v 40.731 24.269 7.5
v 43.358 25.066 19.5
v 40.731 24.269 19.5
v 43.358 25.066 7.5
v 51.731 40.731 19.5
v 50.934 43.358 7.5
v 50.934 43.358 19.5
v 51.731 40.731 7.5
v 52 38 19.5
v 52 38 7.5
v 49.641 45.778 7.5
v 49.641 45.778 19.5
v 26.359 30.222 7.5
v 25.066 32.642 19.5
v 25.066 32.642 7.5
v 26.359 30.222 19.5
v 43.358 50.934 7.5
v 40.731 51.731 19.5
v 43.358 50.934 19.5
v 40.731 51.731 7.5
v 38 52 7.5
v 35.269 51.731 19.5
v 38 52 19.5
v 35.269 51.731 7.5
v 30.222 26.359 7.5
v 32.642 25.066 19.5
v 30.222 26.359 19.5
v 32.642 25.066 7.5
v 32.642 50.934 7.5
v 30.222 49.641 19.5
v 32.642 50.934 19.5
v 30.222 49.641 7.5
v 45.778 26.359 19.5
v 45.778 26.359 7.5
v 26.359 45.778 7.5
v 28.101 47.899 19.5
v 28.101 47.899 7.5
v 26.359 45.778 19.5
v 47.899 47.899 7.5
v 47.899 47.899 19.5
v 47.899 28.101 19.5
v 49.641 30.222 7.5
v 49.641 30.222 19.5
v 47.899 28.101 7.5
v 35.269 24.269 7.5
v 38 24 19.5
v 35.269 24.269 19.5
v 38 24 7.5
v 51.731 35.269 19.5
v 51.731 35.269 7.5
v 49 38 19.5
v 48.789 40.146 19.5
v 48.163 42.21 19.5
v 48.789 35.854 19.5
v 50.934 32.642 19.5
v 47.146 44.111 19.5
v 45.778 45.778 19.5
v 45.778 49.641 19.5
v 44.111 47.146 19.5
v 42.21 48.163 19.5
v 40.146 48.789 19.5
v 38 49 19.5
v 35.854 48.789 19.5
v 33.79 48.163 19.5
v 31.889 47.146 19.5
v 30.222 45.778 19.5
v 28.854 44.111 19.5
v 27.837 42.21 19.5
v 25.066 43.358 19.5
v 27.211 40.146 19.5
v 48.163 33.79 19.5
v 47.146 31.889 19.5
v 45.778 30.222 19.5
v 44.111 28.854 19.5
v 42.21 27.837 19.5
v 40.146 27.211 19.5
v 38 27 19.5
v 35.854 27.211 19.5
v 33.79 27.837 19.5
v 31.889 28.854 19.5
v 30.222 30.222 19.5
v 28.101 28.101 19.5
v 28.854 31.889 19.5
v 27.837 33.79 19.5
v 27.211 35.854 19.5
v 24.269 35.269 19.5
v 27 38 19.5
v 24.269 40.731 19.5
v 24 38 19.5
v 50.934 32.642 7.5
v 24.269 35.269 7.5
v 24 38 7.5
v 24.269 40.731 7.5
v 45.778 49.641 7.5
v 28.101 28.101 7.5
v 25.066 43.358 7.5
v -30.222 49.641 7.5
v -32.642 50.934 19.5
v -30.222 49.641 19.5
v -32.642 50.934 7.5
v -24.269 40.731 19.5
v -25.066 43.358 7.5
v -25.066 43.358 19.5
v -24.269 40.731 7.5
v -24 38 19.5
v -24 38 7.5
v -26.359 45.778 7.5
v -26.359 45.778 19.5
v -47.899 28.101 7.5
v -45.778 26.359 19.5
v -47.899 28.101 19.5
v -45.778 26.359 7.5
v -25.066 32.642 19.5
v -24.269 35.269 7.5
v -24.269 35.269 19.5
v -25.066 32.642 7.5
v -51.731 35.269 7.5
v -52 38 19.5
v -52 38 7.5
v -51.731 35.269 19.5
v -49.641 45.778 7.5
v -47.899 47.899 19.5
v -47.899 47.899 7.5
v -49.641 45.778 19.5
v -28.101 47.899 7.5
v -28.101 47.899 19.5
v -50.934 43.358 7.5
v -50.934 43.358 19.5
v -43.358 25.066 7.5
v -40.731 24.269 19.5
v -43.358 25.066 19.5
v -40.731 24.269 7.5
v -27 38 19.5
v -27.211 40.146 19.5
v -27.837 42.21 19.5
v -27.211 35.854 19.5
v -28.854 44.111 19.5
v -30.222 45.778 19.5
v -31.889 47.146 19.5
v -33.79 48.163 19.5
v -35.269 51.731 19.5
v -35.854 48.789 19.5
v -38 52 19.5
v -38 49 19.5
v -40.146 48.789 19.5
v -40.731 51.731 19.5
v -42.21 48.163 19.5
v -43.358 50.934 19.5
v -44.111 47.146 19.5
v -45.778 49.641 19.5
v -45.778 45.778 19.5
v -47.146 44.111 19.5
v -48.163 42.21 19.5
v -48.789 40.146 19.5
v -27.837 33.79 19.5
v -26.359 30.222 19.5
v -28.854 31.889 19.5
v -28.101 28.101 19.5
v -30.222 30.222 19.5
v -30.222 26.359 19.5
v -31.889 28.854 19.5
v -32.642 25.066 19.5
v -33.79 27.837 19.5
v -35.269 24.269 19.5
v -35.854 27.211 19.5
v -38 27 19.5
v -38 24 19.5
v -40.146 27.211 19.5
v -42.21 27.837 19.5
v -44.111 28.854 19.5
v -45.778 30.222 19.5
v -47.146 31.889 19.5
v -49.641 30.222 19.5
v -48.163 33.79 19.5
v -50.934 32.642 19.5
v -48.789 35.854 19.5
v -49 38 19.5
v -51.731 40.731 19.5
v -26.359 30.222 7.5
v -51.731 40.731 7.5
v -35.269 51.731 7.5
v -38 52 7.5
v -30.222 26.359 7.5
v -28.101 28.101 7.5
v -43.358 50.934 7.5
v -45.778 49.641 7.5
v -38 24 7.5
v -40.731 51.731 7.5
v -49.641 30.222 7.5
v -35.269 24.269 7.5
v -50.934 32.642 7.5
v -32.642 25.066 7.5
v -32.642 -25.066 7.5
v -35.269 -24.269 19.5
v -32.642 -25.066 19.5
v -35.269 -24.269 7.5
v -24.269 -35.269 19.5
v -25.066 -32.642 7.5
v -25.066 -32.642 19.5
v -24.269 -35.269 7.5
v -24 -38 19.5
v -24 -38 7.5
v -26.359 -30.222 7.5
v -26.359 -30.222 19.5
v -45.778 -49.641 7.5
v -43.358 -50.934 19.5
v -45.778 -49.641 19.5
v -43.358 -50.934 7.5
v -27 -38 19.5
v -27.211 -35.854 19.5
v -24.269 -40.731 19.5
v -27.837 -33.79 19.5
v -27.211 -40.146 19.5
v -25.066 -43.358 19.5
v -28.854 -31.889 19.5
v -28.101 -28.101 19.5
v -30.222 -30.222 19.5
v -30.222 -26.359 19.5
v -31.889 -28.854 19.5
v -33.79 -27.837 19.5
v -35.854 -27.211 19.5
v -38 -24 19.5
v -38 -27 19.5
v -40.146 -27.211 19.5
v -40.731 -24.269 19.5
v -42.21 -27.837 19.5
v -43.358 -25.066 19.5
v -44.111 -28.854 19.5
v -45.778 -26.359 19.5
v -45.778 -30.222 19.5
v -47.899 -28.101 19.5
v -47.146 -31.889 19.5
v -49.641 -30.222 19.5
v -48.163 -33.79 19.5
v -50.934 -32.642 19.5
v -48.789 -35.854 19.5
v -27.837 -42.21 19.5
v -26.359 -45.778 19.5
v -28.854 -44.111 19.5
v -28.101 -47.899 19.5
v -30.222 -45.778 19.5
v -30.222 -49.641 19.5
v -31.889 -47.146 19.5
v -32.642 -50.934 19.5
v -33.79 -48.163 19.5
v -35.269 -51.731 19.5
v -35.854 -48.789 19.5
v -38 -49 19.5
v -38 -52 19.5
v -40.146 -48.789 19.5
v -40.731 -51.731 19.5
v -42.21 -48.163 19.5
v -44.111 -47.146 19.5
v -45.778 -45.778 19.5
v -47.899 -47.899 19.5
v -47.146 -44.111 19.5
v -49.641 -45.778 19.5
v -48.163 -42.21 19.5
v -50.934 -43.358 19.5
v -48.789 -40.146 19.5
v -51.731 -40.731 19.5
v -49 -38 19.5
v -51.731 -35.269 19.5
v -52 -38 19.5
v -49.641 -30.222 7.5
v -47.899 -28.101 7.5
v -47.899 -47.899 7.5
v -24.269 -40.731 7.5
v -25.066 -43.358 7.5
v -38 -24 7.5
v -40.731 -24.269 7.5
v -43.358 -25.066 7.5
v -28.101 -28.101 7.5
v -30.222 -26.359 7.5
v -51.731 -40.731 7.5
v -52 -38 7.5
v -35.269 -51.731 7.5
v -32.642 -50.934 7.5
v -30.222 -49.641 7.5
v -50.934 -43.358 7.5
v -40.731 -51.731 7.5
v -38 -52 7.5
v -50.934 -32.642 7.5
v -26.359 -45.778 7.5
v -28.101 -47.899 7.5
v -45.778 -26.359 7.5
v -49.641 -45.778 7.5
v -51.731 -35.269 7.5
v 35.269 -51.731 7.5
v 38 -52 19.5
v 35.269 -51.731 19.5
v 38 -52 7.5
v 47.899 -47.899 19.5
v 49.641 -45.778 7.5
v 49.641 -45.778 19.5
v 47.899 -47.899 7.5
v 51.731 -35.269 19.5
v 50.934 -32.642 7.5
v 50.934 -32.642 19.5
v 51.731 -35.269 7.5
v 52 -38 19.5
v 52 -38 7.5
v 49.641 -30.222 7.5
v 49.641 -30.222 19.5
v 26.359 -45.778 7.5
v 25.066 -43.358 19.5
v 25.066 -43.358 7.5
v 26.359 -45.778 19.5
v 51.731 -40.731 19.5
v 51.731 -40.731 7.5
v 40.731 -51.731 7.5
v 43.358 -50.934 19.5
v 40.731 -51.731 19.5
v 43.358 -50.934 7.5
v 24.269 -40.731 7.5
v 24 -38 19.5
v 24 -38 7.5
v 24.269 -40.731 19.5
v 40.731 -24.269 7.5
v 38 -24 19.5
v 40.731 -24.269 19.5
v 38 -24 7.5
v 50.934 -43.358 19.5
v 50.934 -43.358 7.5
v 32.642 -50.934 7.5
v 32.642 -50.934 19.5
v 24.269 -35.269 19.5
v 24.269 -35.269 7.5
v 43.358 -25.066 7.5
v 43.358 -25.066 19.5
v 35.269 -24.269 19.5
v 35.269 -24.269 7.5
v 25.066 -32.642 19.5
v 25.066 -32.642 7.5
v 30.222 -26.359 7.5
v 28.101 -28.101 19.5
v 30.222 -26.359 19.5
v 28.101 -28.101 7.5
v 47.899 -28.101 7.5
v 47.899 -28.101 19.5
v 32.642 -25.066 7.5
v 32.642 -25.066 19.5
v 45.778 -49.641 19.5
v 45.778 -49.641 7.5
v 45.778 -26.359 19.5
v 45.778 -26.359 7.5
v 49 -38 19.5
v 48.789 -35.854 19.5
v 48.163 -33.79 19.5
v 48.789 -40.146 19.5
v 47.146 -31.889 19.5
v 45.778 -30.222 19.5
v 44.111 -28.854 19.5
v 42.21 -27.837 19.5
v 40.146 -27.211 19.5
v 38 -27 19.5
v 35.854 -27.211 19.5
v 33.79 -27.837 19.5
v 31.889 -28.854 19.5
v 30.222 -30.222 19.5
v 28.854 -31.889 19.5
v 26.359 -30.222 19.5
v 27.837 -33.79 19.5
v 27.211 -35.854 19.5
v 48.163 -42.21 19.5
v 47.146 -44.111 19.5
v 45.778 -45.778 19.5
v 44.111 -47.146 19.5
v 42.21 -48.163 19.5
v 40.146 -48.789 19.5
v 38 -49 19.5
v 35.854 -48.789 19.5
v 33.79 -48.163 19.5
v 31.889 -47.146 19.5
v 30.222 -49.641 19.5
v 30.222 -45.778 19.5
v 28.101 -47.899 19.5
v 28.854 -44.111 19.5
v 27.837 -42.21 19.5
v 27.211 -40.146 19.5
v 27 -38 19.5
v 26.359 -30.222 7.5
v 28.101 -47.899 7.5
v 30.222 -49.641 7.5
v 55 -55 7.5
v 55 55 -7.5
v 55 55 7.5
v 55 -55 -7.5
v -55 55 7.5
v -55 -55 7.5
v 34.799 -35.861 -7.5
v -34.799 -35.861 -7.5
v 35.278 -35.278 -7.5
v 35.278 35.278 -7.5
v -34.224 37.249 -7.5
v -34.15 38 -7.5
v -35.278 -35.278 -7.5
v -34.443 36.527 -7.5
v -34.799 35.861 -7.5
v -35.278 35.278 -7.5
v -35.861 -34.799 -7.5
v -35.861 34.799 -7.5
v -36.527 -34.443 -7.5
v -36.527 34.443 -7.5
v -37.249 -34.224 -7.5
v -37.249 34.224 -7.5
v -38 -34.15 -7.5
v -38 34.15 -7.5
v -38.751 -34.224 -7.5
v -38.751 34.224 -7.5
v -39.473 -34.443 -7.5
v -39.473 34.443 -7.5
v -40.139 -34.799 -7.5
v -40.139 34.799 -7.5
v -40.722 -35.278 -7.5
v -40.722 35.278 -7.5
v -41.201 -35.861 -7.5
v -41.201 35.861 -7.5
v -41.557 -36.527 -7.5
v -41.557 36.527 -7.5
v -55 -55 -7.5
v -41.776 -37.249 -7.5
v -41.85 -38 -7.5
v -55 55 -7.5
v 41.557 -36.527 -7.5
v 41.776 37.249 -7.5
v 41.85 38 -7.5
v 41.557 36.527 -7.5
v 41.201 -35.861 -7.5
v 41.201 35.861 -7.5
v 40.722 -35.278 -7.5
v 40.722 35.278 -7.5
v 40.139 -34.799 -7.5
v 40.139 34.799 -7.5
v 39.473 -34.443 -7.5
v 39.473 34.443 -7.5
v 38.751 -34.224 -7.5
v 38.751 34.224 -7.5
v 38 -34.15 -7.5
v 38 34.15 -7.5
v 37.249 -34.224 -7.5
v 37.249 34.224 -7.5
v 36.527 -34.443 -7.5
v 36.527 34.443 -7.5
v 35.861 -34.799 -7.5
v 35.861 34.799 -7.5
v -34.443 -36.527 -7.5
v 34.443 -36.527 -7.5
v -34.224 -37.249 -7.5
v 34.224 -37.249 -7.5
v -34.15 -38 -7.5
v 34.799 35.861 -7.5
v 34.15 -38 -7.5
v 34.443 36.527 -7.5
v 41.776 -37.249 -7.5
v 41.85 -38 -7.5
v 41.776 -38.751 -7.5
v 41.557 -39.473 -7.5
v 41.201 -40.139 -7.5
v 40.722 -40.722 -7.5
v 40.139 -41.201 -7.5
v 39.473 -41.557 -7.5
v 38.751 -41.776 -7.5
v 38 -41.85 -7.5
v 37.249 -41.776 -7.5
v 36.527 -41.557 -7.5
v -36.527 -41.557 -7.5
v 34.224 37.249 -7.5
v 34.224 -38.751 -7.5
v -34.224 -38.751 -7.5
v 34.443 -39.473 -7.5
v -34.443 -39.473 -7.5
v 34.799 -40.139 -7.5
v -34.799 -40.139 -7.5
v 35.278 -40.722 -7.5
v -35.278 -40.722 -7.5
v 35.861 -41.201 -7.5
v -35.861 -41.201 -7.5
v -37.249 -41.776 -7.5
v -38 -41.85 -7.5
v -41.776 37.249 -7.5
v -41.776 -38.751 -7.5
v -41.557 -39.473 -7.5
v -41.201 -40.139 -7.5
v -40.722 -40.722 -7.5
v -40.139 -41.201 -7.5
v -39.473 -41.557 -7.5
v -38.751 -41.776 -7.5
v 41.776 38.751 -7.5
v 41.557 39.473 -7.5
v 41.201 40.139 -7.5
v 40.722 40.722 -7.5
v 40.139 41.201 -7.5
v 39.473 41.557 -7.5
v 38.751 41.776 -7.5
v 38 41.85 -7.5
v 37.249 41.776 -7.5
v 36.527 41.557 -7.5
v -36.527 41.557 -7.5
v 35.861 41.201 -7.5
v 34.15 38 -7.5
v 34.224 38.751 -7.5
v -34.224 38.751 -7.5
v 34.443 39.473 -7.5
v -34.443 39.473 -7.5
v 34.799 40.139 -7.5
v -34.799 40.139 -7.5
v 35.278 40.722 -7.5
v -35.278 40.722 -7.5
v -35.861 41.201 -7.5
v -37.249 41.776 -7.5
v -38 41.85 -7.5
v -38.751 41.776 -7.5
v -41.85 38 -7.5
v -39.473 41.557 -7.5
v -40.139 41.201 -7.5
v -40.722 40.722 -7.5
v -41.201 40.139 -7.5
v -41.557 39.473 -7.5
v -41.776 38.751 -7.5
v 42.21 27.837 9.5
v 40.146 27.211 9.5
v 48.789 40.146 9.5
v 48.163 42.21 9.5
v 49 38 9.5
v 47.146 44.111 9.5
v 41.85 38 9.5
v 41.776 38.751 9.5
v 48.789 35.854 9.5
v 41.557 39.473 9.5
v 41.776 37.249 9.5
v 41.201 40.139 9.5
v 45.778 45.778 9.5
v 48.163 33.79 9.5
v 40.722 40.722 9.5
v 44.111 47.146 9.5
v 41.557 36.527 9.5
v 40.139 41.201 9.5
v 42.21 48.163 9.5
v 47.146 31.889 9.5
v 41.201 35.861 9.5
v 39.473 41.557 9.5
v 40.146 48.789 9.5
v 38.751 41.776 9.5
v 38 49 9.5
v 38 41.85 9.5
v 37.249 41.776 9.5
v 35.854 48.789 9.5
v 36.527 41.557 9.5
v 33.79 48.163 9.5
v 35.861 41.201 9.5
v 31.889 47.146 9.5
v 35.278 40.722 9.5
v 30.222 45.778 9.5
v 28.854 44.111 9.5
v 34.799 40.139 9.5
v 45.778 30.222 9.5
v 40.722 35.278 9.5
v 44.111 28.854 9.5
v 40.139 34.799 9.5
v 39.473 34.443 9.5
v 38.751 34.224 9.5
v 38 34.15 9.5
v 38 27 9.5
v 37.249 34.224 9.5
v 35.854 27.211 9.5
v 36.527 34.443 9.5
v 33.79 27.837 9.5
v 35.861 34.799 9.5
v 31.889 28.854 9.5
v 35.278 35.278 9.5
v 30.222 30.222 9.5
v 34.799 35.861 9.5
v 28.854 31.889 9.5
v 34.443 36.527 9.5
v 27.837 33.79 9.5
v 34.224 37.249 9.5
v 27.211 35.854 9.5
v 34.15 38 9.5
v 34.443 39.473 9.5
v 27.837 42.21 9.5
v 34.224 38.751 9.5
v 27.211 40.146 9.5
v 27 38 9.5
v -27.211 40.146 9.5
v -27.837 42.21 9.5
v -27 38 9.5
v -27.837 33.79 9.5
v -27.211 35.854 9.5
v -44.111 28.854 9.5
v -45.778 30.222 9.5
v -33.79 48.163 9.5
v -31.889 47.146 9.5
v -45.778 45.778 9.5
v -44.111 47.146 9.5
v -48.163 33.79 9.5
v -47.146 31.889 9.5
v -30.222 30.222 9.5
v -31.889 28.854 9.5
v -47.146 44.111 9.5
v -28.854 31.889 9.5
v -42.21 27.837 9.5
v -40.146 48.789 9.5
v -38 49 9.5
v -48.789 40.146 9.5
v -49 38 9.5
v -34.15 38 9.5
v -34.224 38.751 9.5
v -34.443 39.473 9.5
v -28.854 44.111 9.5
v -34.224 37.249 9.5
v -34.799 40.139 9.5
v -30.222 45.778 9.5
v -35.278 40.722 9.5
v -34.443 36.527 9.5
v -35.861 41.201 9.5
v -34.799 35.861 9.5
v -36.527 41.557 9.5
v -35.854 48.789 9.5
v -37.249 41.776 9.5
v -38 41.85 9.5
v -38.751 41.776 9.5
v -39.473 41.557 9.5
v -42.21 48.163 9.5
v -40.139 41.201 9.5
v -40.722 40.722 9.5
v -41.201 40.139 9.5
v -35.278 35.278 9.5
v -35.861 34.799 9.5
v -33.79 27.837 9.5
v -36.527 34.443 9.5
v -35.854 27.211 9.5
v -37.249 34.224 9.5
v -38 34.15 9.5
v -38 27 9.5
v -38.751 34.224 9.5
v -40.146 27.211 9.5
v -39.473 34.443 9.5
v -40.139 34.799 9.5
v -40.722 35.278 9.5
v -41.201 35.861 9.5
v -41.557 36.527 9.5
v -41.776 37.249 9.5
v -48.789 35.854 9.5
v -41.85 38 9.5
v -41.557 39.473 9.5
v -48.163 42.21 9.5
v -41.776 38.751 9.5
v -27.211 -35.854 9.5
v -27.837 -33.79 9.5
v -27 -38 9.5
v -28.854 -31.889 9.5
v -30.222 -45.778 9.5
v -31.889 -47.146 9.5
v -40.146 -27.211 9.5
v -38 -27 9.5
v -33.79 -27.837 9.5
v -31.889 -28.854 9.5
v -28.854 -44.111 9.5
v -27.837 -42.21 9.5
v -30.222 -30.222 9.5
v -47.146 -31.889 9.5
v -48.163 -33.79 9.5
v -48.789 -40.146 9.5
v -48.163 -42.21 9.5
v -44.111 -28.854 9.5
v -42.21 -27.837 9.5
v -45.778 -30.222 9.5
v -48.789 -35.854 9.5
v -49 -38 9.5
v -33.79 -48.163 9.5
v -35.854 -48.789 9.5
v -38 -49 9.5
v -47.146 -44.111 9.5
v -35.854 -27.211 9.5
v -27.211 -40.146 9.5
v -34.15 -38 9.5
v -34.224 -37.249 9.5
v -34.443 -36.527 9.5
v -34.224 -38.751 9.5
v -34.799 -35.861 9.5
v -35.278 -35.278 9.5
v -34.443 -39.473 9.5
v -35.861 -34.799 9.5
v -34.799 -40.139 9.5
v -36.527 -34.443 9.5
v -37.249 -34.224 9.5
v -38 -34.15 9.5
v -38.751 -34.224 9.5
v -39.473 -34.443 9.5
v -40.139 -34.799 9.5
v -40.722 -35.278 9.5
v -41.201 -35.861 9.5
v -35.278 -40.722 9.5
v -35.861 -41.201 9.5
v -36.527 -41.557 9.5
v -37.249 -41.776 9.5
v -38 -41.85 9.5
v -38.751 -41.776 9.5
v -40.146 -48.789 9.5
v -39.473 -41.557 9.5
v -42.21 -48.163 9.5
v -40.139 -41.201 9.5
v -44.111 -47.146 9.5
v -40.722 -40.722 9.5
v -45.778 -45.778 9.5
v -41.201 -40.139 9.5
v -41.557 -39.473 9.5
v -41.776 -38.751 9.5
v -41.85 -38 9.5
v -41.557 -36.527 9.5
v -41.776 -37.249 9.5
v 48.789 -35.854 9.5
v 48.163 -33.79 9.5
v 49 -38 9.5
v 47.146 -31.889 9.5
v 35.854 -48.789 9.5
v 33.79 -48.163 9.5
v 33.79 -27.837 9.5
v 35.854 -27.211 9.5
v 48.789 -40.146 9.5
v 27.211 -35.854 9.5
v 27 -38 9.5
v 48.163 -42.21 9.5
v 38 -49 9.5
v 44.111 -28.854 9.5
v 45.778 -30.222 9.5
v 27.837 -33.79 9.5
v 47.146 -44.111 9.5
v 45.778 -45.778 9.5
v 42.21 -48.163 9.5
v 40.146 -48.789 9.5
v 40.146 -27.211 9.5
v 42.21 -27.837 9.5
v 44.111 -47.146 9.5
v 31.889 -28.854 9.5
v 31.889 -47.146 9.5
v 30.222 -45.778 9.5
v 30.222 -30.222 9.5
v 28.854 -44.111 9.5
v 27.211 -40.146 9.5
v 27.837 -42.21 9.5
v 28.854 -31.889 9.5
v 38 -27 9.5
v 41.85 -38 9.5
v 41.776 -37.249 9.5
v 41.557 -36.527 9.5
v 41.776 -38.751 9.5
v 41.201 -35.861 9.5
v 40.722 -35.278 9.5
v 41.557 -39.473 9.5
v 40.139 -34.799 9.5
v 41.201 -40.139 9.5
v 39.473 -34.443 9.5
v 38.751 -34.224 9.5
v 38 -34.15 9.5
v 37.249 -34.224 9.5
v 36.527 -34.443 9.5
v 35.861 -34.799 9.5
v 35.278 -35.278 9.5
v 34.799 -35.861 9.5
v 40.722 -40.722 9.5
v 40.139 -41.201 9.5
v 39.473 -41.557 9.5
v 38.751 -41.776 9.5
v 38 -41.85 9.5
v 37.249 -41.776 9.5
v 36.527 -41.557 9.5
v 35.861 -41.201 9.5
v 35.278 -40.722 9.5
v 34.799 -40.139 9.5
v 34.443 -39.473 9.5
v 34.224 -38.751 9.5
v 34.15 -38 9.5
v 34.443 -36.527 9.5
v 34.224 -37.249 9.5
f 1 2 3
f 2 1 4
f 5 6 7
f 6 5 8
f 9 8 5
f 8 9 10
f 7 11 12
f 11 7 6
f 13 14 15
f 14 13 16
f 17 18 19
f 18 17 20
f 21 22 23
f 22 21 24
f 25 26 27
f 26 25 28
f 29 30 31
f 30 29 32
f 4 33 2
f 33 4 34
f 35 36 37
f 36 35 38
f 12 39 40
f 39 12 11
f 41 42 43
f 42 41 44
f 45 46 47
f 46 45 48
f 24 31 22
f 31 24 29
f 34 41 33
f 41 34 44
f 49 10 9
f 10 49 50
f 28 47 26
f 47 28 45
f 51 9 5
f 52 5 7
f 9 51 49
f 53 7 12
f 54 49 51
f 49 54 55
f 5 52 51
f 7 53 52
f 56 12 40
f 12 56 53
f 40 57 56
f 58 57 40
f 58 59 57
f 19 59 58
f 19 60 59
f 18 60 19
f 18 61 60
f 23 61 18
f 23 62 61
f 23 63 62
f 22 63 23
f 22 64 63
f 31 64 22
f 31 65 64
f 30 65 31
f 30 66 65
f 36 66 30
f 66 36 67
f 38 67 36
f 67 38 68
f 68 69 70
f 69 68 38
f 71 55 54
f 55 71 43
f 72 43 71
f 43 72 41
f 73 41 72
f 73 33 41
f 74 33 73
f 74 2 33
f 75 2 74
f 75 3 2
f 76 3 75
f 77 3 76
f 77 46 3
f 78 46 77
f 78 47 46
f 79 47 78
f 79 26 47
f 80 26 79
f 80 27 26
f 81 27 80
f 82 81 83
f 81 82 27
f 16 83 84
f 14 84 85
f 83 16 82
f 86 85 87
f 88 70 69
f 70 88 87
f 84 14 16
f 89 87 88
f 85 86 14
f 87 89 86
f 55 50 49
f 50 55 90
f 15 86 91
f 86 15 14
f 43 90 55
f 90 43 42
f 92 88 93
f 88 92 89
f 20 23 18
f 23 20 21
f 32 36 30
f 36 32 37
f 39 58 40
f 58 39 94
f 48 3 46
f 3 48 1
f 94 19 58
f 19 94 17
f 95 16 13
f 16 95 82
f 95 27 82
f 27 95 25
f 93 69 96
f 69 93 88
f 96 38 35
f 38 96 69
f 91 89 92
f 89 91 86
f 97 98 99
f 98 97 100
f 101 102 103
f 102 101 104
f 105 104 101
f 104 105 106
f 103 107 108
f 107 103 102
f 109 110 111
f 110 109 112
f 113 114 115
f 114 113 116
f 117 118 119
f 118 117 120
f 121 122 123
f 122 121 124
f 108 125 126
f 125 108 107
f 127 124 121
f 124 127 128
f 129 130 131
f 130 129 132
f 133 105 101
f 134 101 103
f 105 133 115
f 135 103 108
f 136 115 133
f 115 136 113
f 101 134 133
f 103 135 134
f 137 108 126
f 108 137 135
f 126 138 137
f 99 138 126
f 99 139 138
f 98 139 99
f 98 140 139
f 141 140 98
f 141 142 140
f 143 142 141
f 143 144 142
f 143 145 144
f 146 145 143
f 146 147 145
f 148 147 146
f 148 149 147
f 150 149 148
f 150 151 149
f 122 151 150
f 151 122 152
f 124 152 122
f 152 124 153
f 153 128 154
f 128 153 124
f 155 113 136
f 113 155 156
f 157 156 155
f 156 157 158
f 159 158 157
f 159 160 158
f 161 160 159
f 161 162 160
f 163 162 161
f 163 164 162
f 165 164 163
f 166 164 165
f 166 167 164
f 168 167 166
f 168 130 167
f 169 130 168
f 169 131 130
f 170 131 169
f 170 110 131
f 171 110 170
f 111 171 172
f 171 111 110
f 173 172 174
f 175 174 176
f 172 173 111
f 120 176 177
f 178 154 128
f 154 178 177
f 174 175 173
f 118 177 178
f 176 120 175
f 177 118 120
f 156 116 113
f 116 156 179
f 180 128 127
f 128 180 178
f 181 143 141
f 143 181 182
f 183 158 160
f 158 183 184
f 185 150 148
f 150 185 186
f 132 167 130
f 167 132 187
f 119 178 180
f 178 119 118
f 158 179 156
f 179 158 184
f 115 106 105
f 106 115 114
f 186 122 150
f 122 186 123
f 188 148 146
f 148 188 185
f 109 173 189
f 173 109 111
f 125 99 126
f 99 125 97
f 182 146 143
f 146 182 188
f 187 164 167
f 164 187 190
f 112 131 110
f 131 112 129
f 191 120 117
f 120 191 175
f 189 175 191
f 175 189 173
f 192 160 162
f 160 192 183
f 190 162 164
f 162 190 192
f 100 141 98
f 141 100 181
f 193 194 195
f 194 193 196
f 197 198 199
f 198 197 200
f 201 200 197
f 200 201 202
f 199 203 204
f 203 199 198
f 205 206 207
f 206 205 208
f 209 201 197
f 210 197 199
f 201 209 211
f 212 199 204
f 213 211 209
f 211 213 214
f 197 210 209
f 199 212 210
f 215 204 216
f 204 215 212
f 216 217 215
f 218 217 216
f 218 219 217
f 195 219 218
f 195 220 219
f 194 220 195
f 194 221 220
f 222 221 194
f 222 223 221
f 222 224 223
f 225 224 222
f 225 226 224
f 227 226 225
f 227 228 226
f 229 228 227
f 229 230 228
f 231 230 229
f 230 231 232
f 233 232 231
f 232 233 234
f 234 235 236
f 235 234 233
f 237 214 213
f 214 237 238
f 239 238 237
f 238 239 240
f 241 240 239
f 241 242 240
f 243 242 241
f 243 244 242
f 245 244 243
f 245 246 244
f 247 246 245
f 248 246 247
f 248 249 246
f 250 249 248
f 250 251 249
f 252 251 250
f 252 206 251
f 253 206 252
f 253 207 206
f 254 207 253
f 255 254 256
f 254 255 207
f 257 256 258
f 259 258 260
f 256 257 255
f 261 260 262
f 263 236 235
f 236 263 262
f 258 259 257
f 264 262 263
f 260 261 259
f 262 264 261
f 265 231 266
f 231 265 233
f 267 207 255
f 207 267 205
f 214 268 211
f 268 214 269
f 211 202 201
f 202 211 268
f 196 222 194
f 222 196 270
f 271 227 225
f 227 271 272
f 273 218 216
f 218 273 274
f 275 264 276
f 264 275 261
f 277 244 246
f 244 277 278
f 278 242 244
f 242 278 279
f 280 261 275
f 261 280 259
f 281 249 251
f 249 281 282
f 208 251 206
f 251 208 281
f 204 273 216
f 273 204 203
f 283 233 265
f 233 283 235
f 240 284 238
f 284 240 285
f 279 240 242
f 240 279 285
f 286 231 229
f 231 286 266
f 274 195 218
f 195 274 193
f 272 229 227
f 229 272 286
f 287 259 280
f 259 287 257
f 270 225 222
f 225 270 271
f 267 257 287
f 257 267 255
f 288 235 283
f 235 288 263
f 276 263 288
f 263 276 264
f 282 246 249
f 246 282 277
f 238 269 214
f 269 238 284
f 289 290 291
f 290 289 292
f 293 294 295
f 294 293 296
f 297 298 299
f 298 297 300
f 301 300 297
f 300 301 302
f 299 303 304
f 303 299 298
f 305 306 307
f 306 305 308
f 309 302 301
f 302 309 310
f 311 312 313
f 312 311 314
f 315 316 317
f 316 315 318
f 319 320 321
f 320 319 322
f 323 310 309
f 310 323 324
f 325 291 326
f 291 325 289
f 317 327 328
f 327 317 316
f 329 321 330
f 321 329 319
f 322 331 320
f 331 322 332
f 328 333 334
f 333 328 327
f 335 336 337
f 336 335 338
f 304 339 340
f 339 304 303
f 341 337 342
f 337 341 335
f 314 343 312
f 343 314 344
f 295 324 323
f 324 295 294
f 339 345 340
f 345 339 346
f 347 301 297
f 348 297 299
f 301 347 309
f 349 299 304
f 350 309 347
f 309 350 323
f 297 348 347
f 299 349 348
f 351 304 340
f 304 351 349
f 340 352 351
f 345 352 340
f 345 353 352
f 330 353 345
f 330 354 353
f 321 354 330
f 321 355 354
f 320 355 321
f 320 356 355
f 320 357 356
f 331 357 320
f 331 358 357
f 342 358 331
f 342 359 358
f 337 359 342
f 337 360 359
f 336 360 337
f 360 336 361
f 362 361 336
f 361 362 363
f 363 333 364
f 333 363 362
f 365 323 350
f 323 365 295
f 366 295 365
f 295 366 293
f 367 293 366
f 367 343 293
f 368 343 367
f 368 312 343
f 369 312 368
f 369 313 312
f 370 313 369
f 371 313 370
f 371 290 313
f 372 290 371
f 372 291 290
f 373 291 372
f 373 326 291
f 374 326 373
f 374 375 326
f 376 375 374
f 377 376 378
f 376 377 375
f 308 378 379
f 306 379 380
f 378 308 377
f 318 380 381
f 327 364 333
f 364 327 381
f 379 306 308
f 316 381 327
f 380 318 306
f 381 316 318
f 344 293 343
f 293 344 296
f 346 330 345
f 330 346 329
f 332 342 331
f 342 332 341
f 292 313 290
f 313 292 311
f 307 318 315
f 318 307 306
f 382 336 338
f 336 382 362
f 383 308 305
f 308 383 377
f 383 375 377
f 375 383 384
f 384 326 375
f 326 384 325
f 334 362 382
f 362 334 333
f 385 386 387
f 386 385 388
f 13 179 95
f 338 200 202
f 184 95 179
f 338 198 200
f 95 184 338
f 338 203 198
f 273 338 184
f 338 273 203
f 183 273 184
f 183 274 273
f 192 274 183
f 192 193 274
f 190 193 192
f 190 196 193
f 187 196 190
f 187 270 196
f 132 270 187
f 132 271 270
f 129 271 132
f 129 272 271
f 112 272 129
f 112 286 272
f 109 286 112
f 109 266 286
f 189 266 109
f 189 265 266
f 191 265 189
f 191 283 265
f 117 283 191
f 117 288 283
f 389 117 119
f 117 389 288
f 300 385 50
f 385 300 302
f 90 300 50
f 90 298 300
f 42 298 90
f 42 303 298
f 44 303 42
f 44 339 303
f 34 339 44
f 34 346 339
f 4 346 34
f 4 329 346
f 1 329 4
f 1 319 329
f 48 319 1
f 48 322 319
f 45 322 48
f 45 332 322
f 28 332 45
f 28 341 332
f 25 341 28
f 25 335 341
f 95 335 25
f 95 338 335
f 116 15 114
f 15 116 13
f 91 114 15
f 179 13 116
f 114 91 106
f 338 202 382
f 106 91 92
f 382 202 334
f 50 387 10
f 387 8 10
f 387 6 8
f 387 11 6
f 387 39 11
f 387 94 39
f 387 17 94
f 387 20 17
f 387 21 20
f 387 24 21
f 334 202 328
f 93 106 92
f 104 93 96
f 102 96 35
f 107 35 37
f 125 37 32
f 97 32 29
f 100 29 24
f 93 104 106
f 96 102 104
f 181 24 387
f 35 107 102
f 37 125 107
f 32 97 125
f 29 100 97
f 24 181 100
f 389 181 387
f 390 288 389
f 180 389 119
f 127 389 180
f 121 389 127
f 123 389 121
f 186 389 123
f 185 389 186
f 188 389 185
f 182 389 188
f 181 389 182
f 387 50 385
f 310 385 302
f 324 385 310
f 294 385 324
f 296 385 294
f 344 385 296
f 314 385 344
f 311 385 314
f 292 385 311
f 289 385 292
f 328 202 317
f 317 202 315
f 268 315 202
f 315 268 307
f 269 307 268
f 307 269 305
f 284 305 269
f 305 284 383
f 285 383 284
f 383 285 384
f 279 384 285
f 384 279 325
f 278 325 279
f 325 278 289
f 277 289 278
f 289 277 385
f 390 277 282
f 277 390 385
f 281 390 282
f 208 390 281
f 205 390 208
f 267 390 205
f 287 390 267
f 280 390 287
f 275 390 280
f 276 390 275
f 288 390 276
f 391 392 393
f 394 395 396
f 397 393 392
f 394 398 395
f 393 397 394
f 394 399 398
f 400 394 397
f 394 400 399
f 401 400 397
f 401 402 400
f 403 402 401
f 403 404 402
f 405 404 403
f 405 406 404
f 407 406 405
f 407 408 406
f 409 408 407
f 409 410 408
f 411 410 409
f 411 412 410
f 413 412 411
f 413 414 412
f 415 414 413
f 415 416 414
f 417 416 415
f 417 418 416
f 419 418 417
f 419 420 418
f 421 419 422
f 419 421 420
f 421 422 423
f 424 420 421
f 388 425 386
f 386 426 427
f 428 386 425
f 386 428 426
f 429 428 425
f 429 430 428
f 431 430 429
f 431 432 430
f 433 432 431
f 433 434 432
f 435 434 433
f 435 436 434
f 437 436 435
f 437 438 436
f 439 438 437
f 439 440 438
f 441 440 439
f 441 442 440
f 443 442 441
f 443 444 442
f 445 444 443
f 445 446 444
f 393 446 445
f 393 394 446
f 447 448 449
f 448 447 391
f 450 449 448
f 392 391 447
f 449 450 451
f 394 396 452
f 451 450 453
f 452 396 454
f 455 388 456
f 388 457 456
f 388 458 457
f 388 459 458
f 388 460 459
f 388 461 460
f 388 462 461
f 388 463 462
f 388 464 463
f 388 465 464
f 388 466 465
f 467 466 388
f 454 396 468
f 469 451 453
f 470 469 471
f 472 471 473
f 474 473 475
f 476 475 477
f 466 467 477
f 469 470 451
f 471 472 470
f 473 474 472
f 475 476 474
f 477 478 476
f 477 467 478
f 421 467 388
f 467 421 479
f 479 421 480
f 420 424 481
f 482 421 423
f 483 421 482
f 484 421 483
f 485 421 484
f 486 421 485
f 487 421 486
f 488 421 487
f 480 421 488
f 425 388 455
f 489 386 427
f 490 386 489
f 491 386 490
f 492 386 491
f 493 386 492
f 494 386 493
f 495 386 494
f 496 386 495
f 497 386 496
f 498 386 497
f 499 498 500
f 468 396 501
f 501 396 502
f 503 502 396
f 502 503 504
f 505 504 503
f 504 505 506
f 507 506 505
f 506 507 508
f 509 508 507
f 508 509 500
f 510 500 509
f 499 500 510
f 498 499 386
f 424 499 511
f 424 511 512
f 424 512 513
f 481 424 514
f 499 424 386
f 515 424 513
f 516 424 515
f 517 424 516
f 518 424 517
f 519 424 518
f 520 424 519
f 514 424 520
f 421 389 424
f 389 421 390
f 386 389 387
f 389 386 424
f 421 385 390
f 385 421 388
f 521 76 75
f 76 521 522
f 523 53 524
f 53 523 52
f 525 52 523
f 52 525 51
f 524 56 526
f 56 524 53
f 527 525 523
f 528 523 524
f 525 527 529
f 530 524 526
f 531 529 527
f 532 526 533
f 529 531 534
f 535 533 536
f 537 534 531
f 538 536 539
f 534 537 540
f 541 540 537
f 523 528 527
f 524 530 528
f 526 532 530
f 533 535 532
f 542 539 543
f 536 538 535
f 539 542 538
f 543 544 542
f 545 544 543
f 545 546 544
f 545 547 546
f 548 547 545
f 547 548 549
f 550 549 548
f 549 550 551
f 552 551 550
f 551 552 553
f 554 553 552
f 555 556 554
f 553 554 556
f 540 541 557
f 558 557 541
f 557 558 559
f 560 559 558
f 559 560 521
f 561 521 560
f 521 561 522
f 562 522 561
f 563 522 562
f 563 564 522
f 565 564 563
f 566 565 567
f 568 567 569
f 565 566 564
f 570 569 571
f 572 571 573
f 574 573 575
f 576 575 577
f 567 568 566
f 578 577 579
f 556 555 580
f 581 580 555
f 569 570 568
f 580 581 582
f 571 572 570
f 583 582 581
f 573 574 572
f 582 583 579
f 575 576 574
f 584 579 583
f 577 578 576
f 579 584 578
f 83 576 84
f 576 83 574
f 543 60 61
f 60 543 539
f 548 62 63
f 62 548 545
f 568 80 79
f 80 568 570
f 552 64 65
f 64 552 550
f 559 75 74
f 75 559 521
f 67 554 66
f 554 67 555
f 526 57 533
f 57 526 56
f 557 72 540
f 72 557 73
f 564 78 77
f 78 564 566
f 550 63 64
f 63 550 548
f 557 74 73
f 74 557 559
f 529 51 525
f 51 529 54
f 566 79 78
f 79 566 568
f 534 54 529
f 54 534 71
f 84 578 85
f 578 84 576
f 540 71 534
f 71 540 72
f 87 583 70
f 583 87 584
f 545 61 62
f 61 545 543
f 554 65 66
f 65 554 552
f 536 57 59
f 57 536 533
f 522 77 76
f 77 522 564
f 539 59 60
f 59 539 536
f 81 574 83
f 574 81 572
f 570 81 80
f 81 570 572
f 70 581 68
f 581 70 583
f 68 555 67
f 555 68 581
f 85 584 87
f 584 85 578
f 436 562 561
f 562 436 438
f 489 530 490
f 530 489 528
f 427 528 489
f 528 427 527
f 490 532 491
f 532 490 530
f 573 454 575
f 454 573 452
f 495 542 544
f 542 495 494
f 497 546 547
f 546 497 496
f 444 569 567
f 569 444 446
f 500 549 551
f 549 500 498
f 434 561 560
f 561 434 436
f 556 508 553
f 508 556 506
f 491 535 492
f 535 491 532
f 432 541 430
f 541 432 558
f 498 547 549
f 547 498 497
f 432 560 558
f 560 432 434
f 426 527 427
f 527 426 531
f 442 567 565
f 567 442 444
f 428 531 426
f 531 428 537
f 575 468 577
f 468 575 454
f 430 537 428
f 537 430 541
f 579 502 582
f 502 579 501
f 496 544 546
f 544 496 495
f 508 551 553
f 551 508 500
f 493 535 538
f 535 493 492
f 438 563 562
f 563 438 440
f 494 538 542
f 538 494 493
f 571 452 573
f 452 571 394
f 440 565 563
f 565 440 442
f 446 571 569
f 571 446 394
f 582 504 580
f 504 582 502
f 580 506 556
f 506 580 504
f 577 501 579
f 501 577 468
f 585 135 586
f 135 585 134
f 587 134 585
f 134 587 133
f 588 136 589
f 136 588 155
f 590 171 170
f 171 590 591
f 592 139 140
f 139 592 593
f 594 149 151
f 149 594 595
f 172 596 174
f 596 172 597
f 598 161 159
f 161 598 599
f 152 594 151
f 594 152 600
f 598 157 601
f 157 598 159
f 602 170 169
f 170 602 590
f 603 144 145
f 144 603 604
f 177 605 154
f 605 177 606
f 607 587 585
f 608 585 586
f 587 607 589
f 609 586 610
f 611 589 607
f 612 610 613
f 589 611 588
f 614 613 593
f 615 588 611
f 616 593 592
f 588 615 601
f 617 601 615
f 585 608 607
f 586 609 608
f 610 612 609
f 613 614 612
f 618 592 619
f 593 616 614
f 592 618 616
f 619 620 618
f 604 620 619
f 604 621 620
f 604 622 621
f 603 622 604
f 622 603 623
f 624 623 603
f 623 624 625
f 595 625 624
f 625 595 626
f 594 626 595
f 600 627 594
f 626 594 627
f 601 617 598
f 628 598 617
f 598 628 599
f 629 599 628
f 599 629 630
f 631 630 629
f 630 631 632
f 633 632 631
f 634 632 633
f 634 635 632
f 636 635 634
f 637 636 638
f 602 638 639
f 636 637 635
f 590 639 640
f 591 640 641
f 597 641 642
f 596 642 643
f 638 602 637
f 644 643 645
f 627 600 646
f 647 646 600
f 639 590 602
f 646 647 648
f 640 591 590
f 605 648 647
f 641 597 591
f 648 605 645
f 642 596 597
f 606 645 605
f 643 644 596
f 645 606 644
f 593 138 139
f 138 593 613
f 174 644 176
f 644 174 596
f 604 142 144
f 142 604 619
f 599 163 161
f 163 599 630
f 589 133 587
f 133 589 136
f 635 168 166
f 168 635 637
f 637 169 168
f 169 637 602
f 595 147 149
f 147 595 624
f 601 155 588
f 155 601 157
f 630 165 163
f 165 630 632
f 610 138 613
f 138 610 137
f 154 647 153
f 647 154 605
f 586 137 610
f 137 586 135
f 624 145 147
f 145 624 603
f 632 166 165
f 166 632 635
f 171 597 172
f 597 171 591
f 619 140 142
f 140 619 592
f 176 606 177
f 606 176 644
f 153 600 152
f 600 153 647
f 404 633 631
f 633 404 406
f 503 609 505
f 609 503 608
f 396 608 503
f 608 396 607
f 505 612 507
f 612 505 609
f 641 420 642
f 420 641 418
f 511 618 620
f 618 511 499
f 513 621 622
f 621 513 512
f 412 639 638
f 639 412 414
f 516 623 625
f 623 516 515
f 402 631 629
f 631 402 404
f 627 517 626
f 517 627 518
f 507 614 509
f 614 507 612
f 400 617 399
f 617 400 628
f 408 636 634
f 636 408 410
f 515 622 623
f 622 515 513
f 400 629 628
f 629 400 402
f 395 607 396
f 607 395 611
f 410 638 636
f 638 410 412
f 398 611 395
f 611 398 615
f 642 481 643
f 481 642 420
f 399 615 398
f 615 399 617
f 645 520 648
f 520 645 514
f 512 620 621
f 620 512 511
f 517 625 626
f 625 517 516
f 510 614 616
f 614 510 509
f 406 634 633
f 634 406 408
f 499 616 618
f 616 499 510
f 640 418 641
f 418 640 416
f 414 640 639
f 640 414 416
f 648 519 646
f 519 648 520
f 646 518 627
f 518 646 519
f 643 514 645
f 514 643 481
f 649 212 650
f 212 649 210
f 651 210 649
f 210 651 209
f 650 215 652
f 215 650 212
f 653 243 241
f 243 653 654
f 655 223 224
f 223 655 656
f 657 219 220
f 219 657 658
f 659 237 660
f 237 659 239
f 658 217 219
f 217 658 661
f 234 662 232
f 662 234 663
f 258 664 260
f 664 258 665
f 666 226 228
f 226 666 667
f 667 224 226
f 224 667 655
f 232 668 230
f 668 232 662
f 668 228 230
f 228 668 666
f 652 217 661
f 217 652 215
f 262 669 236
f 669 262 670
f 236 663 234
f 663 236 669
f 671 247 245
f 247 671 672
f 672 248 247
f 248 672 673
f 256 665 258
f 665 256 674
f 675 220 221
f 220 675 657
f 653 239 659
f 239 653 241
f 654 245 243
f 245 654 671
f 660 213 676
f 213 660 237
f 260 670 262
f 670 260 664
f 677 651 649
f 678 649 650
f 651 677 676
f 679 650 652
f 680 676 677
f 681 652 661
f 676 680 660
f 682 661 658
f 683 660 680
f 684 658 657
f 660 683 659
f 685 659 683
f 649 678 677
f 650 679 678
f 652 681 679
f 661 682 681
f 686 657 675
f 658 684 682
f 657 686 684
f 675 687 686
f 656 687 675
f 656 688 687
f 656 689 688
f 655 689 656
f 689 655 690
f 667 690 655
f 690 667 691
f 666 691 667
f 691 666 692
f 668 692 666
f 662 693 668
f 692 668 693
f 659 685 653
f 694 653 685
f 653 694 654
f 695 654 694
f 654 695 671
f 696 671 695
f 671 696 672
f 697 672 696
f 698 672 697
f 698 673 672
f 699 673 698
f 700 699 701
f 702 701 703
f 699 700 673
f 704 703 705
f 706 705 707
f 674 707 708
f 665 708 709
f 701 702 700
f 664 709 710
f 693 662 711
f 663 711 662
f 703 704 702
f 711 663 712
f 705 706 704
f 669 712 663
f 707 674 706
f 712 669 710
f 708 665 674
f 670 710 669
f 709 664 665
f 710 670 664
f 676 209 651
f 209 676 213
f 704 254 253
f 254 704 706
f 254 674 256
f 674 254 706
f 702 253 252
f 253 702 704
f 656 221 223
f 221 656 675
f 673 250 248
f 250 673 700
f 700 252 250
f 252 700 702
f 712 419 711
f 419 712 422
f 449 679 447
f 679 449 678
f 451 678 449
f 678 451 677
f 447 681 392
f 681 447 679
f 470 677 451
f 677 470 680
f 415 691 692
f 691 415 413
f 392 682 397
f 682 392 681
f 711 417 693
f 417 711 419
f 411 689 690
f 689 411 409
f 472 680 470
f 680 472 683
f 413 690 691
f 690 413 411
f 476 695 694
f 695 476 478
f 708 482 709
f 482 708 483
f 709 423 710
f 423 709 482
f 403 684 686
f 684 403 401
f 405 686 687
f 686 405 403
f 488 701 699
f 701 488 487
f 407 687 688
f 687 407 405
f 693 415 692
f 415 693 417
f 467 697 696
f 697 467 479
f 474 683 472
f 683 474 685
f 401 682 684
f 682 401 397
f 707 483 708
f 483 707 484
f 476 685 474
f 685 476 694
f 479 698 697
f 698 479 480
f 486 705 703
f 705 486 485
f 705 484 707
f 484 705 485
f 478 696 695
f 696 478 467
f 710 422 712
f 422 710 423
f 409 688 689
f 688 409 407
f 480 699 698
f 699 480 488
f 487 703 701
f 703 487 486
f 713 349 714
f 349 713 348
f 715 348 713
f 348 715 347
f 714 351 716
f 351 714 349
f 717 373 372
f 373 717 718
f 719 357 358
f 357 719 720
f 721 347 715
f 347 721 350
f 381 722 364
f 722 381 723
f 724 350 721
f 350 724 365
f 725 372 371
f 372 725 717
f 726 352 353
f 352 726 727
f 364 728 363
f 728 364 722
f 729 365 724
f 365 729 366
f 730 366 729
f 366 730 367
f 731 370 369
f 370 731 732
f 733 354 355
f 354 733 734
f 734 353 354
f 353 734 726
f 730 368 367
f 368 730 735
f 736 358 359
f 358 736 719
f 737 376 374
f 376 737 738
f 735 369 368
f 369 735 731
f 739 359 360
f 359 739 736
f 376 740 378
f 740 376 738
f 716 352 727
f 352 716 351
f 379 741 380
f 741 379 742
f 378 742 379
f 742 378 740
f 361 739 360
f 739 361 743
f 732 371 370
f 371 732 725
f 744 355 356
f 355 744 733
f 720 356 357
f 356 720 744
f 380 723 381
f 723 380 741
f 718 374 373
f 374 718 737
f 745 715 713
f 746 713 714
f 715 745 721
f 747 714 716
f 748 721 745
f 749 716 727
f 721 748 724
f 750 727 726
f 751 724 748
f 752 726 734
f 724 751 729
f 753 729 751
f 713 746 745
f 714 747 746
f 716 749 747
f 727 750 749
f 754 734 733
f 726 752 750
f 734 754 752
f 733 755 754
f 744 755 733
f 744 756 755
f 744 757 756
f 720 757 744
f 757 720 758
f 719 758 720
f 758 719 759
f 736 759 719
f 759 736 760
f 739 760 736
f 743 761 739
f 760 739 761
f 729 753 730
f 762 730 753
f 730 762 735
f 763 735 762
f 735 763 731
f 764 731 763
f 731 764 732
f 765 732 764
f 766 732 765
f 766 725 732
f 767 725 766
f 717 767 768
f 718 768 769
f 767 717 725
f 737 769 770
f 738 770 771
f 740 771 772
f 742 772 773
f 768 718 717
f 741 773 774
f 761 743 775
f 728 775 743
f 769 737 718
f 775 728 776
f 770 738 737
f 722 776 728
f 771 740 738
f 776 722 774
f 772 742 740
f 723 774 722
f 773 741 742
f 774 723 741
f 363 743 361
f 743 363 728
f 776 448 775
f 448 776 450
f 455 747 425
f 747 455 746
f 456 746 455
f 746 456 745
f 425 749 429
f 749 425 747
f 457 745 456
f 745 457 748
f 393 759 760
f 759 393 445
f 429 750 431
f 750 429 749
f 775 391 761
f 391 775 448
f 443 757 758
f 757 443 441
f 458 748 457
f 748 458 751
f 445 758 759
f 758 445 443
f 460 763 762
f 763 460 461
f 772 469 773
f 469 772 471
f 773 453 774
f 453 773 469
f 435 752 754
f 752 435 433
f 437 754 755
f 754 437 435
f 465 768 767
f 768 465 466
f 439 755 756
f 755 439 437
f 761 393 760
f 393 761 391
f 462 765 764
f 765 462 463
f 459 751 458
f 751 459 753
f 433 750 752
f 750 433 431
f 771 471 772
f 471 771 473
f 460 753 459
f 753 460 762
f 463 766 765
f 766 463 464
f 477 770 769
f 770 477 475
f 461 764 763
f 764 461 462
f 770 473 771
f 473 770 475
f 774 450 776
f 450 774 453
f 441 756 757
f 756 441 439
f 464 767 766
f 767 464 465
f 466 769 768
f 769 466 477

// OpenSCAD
$fn = 32;

// ----------------------------------------------------------------------
// Socket pad plate
// bosses with counterbored sockets for the screws
// ----------------------------------------------------------------------

// --- parameters (mm) ---
base_t = 15;             // base plate thickness
boss_h = 12;             // boss height above the base plate
boss_d = 28;             // boss diameter
socket_d = 22;           // socket diameter
socket_depth = 10;       // socket depth from the boss face
bolt_d = 7.7;            // screw clearance hole through the socket floor
plate = [110, 110, 15];  // overall size (x, y, z)
edge = 17;               // boss centre offset from the plate edge
pads = 4;                // boss count, one per corner

// --- derived feature positions (mm) ---
height = base_t + boss_h;        // = 27   overall height of the part
corner_x = plate[0] / 2 - edge;  // = 38   boss centre X
corner_y = plate[1] / 2 - edge;  // = 38   boss centre Y
feature_centers = [
  [corner_x, corner_y],
  [-corner_x, corner_y],
  [-corner_x, -corner_y],
  [corner_x, -corner_y]
];   // boss centres: sockets, holes and the pads themselves are placed from here

// base plate, bosses on feature_centers, socket + through hole in each
difference() {
  union() {
    cube(plate, center = true);
    for (centre = feature_centers)
      translate([centre[0], centre[1], plate[2] / 2 - 1])
        cylinder(d = boss_d, h = boss_h + 1);
  }
  for (centre = feature_centers) {
    translate([centre[0], centre[1], plate[2] / 2 + boss_h - socket_depth])
      cylinder(d = socket_d, h = socket_depth + 1);
    translate([centre[0], centre[1], -height])
      cylinder(d = bolt_d, h = 2 * height + 2);  // through the socket floor
  }
}
